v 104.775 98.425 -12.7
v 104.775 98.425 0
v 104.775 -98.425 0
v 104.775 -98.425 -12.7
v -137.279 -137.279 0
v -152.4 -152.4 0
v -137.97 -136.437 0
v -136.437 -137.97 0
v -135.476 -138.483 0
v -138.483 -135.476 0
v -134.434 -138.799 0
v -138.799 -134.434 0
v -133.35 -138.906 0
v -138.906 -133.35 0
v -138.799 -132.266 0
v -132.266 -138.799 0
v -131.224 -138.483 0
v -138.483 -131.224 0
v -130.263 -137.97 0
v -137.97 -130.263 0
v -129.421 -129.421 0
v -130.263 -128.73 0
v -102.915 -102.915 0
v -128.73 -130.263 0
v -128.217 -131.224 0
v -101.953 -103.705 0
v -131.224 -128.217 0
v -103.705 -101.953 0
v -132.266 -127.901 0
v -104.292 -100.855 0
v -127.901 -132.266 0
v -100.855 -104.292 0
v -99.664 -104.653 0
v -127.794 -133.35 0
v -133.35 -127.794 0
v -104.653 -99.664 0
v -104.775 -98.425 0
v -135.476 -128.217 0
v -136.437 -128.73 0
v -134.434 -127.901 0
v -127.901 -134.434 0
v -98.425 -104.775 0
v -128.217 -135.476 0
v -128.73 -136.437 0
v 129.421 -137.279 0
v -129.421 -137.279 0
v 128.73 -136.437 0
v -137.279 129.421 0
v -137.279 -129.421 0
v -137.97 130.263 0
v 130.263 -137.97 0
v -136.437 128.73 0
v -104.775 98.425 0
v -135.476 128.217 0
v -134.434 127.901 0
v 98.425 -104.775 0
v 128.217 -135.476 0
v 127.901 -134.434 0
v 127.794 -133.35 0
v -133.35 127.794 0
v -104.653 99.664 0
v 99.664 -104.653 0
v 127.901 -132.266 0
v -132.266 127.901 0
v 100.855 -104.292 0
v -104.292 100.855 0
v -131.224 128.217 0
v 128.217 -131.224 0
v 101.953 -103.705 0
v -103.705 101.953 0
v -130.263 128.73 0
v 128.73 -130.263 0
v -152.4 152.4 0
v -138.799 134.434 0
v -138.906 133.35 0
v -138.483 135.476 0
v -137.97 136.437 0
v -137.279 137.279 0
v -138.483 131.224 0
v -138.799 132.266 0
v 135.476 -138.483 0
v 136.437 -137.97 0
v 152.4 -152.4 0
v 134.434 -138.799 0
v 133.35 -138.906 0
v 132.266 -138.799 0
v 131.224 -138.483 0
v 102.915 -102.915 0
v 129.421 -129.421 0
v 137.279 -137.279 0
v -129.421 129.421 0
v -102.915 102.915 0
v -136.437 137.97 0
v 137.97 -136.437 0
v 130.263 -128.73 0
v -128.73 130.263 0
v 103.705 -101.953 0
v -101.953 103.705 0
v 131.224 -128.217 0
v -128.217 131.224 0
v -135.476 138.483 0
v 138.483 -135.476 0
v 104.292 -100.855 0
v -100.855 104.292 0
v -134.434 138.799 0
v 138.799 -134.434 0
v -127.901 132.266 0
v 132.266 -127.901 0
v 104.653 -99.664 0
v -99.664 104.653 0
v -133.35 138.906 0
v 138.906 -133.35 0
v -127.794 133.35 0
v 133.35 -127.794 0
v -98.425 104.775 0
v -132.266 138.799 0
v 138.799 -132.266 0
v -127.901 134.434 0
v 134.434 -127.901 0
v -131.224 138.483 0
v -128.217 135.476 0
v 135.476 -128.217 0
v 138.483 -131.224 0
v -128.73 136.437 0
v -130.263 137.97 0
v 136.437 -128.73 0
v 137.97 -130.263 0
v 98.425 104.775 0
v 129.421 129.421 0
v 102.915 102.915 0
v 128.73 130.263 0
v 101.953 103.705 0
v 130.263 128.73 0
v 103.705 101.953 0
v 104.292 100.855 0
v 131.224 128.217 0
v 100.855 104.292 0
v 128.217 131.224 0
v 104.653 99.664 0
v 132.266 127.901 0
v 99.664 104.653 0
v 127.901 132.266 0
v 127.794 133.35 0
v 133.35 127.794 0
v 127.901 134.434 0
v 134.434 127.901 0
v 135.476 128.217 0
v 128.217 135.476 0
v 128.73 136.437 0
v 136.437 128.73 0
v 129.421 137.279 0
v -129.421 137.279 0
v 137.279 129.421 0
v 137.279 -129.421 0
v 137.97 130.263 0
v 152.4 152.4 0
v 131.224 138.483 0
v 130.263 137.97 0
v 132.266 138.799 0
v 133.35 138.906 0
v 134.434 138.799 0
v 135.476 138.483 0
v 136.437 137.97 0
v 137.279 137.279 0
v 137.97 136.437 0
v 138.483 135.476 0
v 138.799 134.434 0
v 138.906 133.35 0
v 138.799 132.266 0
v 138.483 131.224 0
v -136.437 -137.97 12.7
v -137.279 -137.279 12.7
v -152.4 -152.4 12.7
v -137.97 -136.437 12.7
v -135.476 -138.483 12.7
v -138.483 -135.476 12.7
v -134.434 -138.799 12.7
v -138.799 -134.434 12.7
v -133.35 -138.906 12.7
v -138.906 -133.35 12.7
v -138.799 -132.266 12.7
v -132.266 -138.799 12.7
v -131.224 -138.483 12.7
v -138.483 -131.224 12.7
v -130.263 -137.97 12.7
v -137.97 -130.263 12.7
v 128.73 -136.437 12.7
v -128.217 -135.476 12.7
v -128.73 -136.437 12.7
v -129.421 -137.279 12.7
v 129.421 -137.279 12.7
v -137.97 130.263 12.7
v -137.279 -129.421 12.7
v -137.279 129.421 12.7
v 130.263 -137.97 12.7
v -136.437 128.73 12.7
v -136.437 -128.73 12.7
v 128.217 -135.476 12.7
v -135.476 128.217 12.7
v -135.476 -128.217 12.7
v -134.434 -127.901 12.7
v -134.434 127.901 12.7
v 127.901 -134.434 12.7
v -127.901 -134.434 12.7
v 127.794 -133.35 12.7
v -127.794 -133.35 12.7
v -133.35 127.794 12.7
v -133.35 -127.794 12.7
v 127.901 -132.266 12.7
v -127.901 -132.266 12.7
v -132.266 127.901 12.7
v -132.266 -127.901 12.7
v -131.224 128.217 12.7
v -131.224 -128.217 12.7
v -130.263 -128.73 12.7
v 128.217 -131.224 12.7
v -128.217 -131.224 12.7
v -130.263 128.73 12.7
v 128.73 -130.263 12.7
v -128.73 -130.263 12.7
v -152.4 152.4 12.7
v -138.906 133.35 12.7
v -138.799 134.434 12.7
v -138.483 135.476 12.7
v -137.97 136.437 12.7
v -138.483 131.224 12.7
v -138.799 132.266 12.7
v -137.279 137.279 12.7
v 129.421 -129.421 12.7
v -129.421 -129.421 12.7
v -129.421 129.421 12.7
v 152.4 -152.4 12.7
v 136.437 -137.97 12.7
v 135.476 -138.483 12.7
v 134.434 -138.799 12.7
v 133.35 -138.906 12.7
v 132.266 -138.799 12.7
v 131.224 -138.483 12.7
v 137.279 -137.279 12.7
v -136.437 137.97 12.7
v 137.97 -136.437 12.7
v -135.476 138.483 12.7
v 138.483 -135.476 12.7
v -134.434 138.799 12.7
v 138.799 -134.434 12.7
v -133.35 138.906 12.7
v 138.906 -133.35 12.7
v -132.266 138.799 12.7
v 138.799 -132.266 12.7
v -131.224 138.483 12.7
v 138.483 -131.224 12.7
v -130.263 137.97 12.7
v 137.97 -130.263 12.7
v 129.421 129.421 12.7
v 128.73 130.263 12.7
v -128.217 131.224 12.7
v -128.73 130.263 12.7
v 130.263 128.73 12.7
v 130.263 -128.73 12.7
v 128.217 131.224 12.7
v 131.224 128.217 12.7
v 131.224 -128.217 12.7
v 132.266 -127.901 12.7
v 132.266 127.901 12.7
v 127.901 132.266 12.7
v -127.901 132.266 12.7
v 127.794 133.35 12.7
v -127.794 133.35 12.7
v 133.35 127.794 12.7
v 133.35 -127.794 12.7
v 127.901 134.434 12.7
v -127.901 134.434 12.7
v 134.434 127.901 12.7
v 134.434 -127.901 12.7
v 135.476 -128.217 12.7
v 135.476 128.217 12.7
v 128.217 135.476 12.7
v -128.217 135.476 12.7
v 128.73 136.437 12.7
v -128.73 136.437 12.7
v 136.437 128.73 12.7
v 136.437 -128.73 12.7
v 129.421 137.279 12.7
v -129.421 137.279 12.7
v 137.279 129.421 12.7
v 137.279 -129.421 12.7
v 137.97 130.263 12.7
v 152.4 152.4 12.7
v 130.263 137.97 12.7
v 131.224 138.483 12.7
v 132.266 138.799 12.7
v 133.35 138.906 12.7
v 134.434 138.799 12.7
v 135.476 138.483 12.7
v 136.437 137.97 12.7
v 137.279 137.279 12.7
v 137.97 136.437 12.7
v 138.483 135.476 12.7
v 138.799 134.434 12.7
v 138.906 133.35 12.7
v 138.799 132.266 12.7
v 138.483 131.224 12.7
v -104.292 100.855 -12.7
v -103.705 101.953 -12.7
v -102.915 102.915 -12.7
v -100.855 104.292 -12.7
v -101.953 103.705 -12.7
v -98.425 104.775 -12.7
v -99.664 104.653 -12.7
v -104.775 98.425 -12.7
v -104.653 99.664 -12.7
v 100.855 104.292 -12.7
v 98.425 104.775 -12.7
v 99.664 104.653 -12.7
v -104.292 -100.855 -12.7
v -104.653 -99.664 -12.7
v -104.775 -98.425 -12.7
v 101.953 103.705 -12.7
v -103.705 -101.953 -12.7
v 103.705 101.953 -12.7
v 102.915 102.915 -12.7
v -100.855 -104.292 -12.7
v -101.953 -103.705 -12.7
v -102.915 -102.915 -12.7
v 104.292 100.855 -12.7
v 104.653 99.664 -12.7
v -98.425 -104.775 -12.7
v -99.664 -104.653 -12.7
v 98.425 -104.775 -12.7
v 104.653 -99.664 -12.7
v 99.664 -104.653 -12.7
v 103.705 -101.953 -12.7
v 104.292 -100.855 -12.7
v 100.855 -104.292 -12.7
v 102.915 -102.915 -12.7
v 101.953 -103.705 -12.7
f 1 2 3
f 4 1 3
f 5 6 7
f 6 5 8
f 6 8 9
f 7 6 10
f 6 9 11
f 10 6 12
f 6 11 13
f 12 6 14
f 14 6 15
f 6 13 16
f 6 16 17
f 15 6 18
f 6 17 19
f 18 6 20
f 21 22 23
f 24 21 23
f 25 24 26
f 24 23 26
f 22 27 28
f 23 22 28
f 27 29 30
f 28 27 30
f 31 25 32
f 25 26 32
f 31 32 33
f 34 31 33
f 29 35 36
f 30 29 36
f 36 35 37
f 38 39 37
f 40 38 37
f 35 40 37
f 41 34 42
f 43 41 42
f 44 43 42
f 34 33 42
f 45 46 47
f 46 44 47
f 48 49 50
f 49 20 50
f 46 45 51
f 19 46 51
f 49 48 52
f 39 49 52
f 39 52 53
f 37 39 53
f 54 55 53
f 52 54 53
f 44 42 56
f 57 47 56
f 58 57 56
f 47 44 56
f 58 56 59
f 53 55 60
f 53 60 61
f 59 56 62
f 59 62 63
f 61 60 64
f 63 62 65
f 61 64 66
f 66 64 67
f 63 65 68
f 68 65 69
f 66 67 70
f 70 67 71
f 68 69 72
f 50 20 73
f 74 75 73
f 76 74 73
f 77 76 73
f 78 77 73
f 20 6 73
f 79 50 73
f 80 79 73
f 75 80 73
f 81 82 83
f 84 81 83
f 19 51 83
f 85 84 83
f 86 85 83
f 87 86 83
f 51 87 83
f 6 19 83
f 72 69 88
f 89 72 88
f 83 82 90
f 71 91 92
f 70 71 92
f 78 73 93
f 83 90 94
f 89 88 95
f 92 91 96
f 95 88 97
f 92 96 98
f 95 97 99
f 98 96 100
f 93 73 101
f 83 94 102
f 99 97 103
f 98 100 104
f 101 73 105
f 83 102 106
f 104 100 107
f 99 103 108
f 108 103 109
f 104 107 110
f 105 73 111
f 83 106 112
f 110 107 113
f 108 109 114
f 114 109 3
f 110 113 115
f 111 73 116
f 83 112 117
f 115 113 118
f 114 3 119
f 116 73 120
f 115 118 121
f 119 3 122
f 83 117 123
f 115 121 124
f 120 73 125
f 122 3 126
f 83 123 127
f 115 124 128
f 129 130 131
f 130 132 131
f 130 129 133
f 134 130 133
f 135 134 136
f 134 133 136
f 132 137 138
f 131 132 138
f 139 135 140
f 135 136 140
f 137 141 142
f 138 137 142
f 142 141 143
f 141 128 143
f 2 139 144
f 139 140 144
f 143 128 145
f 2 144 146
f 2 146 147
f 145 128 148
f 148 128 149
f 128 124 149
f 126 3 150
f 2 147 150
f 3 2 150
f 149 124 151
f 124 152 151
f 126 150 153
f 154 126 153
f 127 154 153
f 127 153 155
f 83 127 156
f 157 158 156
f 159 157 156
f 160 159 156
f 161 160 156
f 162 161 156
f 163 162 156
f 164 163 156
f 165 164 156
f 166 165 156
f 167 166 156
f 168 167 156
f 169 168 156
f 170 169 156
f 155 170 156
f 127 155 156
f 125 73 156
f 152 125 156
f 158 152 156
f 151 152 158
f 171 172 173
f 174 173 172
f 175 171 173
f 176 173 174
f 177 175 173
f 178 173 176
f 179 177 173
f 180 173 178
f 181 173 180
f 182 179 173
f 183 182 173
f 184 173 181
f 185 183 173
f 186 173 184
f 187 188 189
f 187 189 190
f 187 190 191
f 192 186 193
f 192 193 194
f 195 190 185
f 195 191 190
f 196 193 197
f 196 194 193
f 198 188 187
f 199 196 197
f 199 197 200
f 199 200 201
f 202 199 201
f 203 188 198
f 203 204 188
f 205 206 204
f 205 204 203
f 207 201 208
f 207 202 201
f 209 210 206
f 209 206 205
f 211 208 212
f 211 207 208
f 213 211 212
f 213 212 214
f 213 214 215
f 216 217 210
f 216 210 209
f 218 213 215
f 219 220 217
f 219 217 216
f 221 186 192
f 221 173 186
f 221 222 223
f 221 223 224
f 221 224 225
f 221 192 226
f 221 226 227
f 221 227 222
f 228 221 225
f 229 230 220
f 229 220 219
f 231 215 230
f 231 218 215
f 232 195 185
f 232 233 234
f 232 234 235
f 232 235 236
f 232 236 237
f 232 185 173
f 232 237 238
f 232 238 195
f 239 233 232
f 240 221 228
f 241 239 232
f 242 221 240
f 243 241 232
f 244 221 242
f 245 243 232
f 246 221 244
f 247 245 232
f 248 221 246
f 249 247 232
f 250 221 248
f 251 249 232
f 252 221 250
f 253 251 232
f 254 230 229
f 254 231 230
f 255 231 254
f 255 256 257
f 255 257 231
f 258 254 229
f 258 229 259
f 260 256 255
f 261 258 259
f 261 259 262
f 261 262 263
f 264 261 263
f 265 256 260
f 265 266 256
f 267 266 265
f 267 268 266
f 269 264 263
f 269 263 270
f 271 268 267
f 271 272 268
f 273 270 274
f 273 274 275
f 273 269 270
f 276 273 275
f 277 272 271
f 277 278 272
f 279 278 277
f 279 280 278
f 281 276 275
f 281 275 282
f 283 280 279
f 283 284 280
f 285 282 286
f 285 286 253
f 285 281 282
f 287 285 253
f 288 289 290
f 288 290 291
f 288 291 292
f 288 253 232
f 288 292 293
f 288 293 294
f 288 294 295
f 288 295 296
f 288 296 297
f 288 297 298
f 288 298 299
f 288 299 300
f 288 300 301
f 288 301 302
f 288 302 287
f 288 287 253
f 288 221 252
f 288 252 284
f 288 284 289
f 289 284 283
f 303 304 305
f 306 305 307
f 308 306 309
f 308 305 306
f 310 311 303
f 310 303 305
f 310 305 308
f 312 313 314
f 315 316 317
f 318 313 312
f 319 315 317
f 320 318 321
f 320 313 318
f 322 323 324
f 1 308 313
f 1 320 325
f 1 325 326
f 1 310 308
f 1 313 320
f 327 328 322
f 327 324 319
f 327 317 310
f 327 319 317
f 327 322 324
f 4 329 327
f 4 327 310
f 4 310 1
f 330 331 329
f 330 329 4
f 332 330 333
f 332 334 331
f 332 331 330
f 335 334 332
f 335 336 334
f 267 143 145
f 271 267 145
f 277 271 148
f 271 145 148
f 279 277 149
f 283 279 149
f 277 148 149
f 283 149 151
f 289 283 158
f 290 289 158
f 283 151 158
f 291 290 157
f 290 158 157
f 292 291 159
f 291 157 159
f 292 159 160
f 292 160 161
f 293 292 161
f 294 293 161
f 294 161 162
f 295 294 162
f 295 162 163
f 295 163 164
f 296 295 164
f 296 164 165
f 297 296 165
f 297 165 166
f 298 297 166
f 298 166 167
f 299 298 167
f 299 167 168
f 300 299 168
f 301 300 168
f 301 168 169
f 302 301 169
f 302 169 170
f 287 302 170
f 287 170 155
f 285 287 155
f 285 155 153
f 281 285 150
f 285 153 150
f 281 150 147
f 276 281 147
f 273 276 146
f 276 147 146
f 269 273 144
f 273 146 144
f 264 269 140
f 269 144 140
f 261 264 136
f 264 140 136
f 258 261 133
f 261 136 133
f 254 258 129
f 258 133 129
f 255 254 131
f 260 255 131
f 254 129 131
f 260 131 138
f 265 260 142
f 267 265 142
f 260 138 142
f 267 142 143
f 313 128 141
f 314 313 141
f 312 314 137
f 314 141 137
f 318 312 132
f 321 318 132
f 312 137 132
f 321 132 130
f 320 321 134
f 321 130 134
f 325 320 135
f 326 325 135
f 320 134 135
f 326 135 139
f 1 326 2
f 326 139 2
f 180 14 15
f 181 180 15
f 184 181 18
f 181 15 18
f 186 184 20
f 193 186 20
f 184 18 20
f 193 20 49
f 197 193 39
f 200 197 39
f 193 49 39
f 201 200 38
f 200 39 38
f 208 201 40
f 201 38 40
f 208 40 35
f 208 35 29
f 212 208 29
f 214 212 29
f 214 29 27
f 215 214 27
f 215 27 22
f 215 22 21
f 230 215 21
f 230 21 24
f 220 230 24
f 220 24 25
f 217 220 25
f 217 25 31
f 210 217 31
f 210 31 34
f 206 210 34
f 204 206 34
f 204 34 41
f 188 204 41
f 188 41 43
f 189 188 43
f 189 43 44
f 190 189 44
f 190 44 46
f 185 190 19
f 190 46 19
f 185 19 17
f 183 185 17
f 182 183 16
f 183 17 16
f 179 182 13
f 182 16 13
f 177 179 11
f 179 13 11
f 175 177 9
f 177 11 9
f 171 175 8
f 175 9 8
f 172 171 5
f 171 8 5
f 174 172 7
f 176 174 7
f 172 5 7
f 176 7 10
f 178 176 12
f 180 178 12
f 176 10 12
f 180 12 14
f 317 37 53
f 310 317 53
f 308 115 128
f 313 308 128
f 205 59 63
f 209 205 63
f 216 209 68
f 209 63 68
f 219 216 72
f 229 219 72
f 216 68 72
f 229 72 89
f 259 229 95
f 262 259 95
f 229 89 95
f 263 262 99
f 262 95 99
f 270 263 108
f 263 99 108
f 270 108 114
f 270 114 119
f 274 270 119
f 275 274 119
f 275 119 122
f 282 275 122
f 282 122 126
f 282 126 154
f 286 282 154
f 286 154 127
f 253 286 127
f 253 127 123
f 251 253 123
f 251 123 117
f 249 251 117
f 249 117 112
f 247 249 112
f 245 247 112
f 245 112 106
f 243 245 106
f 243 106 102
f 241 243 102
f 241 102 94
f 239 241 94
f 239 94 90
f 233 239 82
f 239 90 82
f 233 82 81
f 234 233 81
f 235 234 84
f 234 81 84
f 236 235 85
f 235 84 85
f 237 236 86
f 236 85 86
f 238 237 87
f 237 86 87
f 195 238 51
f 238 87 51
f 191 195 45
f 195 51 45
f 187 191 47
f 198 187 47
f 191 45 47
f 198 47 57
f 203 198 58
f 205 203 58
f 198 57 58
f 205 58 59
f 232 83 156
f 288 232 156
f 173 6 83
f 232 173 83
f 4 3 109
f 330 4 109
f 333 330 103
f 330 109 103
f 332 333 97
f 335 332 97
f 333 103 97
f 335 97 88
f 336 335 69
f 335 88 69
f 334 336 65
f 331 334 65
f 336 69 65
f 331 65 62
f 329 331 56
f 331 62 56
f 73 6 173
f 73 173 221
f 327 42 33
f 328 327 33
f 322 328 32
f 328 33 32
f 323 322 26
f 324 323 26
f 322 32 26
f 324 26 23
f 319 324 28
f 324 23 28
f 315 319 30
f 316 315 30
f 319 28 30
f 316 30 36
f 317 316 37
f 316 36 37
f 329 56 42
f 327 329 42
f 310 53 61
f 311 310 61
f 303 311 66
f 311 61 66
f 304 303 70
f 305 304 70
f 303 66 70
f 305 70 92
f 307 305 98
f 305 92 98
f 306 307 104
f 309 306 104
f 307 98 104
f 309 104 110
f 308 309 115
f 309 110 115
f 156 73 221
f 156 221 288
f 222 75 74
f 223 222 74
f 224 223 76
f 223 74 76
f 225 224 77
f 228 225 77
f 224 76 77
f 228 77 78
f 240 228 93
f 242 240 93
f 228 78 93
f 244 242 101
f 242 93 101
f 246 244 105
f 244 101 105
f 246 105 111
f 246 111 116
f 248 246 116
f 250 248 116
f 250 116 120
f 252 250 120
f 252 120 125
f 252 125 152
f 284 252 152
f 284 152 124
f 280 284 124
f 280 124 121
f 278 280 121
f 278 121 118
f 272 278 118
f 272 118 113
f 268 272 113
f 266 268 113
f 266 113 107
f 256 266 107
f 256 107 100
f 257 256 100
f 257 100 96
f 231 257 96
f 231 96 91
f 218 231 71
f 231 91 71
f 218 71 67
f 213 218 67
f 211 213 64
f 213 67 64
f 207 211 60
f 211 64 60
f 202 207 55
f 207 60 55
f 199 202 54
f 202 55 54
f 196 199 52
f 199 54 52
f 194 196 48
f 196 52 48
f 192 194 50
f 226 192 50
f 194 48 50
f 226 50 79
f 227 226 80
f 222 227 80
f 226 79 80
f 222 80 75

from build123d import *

# Parameters (mm, degrees)
F0_W     = 304.8
F0_H     = 304.8
F1_DEPTH = 12.7
F3_DEPTH = 12.7
F5_D     = 11.1125


with BuildPart() as f1:
    # F0 (on Top) → F1 (new body)
    with BuildSketch(Plane.XY):
        Rectangle(F0_W, F0_H)
    extrude(amount=F1_DEPTH)

    # F2 (on face) → F3 (join)
    with BuildSketch(Plane(origin=(0, 0, 0), x_dir=(1, 0, 0), z_dir=(0, 0, -1))):
        with BuildLine():
            Line((98.425, 104.775), (-98.425, 104.775))
            ThreePointArc((-98.425, 104.775), (-102.915128, 102.915128), (-104.775, 98.425))
            Line((-104.775, 98.425), (-104.775, -98.425))
            ThreePointArc((-104.775, -98.425), (-102.915128, -102.915128), (-98.425, -104.775))
            Line((-98.425, -104.775), (98.425, -104.775))
            ThreePointArc((98.425, -104.775), (102.915128, -102.915128), (104.775, -98.425))
            Line((104.775, -98.425), (104.775, 98.425))
            ThreePointArc((104.775, 98.425), (102.915128, 102.915128), (98.425, 104.775))
        make_face()
    extrude(amount=F3_DEPTH)

    # F5 (through all)
    with Locations(Plane.XY.offset(12.7)):
        with Locations((-133.35, 133.35), (133.35, 133.35), (133.35, -133.35), (-133.35, -133.35)):
            Hole(F5_D / 2)


solid = f1.part
